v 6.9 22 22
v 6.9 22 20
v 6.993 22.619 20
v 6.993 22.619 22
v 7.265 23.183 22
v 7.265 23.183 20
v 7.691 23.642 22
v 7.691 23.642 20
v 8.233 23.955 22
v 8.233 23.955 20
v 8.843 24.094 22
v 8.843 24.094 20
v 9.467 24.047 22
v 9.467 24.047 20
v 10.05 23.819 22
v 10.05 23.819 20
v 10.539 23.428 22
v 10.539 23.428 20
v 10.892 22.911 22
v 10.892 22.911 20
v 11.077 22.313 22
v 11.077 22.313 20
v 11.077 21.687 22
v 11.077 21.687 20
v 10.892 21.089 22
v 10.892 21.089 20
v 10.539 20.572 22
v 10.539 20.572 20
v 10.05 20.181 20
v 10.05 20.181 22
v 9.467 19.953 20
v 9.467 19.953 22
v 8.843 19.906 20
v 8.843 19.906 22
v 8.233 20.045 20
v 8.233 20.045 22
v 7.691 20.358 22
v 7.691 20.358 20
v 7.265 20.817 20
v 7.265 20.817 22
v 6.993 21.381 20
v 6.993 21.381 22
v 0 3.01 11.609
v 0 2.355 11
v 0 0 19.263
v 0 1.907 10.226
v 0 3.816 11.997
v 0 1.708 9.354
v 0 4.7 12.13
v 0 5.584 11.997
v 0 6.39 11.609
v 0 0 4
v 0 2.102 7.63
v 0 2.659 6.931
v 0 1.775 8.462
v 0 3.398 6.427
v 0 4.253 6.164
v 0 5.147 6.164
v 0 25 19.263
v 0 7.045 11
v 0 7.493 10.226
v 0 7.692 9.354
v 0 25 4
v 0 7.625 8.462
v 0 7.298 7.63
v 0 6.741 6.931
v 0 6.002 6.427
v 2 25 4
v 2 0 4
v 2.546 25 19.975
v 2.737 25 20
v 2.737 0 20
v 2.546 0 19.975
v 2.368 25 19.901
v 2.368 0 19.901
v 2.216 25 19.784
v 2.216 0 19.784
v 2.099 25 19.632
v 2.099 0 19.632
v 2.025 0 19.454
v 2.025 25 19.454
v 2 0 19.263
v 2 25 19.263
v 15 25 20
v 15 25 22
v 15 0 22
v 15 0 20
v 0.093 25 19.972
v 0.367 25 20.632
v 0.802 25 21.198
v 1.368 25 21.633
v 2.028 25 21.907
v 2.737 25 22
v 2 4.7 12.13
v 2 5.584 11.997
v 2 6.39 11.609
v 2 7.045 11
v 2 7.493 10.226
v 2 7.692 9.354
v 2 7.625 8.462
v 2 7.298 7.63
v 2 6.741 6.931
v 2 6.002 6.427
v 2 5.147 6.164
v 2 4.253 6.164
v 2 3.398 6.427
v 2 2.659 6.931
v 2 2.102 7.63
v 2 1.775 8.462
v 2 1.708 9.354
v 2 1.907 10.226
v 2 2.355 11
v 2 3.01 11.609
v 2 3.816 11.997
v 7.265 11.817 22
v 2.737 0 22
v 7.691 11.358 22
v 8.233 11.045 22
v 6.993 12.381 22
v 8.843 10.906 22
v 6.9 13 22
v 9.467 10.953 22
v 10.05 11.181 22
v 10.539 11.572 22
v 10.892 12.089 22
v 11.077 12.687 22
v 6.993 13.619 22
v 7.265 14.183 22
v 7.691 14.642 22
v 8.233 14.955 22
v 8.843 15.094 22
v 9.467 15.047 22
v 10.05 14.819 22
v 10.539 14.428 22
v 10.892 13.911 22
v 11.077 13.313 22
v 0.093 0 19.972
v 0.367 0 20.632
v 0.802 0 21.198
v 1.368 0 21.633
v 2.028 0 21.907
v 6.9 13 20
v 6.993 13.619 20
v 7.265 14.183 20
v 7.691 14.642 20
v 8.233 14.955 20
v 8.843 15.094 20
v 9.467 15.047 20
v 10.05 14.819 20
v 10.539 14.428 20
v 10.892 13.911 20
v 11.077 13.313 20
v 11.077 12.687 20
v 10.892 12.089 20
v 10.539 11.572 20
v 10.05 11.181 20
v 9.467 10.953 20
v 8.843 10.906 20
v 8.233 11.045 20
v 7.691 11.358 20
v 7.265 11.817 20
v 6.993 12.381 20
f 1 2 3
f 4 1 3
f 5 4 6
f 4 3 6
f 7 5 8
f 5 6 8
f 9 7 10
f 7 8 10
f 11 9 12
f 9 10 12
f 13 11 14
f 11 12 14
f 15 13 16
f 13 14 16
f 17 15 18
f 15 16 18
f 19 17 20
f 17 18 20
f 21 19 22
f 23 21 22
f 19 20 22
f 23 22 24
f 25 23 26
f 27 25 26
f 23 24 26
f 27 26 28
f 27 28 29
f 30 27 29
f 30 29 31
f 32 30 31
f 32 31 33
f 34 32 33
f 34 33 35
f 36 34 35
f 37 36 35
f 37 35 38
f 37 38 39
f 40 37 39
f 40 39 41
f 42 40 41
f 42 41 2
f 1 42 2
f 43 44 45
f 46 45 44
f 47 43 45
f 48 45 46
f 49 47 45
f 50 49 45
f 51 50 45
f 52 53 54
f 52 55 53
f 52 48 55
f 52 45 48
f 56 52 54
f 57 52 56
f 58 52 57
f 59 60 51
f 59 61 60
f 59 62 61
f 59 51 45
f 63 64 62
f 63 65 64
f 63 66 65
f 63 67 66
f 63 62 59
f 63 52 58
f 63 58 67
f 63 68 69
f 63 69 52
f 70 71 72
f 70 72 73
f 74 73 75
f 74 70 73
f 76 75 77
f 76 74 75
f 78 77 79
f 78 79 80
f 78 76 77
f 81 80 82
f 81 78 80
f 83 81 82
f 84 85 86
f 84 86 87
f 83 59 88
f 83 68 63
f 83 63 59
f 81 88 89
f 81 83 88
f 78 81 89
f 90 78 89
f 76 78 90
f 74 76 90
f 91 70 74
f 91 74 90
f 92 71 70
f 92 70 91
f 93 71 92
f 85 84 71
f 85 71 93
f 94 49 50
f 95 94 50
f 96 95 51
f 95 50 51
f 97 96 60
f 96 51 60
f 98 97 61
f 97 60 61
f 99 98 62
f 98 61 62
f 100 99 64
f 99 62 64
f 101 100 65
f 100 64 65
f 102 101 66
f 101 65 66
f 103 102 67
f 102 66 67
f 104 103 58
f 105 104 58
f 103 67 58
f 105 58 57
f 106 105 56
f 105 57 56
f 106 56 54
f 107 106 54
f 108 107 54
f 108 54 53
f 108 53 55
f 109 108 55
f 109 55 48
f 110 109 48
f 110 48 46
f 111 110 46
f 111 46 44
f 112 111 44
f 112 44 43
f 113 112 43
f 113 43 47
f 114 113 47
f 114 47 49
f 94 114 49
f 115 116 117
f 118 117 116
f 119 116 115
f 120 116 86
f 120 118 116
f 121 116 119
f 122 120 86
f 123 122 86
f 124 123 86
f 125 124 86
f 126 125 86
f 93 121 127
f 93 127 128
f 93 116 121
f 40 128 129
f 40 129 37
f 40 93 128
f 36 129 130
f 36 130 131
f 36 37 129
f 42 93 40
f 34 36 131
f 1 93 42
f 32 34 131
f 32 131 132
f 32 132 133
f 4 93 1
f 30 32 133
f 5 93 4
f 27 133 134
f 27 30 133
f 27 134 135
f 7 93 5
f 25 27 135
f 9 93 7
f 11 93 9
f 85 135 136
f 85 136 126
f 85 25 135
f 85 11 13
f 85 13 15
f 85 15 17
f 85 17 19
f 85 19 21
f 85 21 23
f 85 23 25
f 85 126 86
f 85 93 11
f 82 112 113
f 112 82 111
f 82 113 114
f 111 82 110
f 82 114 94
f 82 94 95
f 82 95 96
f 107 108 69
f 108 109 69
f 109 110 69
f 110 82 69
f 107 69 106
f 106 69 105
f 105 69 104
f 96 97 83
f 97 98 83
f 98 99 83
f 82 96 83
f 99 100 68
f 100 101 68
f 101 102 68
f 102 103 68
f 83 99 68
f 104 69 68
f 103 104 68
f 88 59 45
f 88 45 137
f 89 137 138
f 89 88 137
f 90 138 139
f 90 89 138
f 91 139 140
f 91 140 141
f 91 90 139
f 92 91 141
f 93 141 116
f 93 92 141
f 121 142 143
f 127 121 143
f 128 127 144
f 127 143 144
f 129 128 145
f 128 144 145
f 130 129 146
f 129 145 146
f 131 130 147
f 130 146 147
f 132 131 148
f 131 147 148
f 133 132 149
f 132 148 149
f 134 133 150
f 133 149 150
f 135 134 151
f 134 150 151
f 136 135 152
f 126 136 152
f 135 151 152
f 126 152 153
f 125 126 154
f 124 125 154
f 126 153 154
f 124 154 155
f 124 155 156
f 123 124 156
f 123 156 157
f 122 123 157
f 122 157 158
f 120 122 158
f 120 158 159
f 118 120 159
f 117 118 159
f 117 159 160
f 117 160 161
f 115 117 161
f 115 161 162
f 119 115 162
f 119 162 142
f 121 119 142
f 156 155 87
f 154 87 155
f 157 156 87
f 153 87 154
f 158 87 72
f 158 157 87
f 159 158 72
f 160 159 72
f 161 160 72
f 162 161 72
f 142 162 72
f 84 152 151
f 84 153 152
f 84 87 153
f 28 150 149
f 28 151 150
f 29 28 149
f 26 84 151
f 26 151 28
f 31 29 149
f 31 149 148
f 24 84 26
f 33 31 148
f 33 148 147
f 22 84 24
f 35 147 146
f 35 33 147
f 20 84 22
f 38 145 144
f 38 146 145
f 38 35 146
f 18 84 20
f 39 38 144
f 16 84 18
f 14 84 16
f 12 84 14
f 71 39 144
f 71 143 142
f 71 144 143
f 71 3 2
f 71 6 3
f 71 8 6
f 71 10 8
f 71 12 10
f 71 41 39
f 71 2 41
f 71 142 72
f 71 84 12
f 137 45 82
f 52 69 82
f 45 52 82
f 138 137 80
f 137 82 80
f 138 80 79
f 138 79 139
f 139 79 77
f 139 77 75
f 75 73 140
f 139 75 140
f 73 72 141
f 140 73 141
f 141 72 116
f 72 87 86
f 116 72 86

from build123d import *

# Parameters (mm, degrees)
SKETCH_1_W                       = 2
SKETCH_1_H                       = 25
SM_BASE_FLANGE_1_DEPTH           = 22
SM_EDGE_FLANGE_2_STRIP_W         = 9.4732
SM_EDGE_FLANGE_2_STRIP_H         = 2
SM_EDGE_FLANGE_2_STRIP_CUT_DEPTH = 25
SM_EDGE_FLANGE_2_DEPTH           = 25
SKETCH_12_R                      = 3
CUT_EXTRUDE_2_DEPTH              = 10
SKETCH_13_R                      = 2.1
CUT_EXTRUDE_3_DEPTH              = 10
SKETCH_14_W                      = 3.568083007
SKETCH_14_H                      = 26.91386829
CUT_EXTRUDE_4_DEPTH              = 4


# Sheet-metal steps are written as plain solids
with BuildPart() as part:
    # Sketch 1 → 基体-法兰1 (new body)
    with BuildSketch(Plane.XY):
        with Locations((1, 12.5)):
            Rectangle(SKETCH_1_W, SKETCH_1_H)
    extrude(amount=SM_BASE_FLANGE_1_DEPTH)

    # 边线-法兰2 strip (across the edge) → 边线-法兰2 strip cut (cut)
    with BuildSketch(Plane(origin=(2, 25, 22), x_dir=(0, 0, -1), z_dir=(0, -1, 0))):
        with Locations((-2, -1)):
            Rectangle(SM_EDGE_FLANGE_2_STRIP_W, SM_EDGE_FLANGE_2_STRIP_H)
    extrude(amount=SM_EDGE_FLANGE_2_STRIP_CUT_DEPTH, mode=Mode.SUBTRACT)

    # 边线-法兰2 section (across the edge) → 边线-法兰2 (add)
    with BuildSketch(Plane(origin=(2, 25, 22), x_dir=(0, 0, -1), z_dir=(0, -1, 0))):
        with BuildLine():
            Line((0, 0.7366), (0, 13))
            Line((0, 13), (2, 13))
            Line((2, 13), (2, 0.7366))
            ThreePointArc((2, 0.7366), (2.215745145, 0.215745145), (2.7366, 0))
            Line((2.7366, 0), (2.7366, -2))
            ThreePointArc((2.7366, -2), (0.801531583, -1.198468417), (0, 0.7366))
        make_face()
    extrude(amount=SM_EDGE_FLANGE_2_DEPTH)

    # 草图12 → 切除-拉伸2 (cut)
    with BuildSketch(Plane.ZY):
        with Locations((9.13, 4.7)):
            Circle(SKETCH_12_R)
    extrude(amount=-CUT_EXTRUDE_2_DEPTH, mode=Mode.SUBTRACT)

    # 草图13 → 切除-拉伸3 (cut)
    with BuildSketch(Plane(origin=(0, 0, 20), x_dir=(-1, 0, 0), z_dir=(0, 0, -1))):
        with Locations((-9, 13)):
            Circle(SKETCH_13_R)
        with Locations((-9, 22)):
            Circle(SKETCH_13_R)
    extrude(amount=-CUT_EXTRUDE_3_DEPTH, mode=Mode.SUBTRACT)

    # 草图14 → 切除-拉伸4 (cut)
    with BuildSketch(Plane(origin=(0, 0, 0), x_dir=(-1, 0, 0), z_dir=(0, 0, -1))):
        with Locations((-1.784041504, 13.456934145)):
            Rectangle(SKETCH_14_W, SKETCH_14_H)
    extrude(amount=-CUT_EXTRUDE_4_DEPTH, mode=Mode.SUBTRACT)


solid = part.part
